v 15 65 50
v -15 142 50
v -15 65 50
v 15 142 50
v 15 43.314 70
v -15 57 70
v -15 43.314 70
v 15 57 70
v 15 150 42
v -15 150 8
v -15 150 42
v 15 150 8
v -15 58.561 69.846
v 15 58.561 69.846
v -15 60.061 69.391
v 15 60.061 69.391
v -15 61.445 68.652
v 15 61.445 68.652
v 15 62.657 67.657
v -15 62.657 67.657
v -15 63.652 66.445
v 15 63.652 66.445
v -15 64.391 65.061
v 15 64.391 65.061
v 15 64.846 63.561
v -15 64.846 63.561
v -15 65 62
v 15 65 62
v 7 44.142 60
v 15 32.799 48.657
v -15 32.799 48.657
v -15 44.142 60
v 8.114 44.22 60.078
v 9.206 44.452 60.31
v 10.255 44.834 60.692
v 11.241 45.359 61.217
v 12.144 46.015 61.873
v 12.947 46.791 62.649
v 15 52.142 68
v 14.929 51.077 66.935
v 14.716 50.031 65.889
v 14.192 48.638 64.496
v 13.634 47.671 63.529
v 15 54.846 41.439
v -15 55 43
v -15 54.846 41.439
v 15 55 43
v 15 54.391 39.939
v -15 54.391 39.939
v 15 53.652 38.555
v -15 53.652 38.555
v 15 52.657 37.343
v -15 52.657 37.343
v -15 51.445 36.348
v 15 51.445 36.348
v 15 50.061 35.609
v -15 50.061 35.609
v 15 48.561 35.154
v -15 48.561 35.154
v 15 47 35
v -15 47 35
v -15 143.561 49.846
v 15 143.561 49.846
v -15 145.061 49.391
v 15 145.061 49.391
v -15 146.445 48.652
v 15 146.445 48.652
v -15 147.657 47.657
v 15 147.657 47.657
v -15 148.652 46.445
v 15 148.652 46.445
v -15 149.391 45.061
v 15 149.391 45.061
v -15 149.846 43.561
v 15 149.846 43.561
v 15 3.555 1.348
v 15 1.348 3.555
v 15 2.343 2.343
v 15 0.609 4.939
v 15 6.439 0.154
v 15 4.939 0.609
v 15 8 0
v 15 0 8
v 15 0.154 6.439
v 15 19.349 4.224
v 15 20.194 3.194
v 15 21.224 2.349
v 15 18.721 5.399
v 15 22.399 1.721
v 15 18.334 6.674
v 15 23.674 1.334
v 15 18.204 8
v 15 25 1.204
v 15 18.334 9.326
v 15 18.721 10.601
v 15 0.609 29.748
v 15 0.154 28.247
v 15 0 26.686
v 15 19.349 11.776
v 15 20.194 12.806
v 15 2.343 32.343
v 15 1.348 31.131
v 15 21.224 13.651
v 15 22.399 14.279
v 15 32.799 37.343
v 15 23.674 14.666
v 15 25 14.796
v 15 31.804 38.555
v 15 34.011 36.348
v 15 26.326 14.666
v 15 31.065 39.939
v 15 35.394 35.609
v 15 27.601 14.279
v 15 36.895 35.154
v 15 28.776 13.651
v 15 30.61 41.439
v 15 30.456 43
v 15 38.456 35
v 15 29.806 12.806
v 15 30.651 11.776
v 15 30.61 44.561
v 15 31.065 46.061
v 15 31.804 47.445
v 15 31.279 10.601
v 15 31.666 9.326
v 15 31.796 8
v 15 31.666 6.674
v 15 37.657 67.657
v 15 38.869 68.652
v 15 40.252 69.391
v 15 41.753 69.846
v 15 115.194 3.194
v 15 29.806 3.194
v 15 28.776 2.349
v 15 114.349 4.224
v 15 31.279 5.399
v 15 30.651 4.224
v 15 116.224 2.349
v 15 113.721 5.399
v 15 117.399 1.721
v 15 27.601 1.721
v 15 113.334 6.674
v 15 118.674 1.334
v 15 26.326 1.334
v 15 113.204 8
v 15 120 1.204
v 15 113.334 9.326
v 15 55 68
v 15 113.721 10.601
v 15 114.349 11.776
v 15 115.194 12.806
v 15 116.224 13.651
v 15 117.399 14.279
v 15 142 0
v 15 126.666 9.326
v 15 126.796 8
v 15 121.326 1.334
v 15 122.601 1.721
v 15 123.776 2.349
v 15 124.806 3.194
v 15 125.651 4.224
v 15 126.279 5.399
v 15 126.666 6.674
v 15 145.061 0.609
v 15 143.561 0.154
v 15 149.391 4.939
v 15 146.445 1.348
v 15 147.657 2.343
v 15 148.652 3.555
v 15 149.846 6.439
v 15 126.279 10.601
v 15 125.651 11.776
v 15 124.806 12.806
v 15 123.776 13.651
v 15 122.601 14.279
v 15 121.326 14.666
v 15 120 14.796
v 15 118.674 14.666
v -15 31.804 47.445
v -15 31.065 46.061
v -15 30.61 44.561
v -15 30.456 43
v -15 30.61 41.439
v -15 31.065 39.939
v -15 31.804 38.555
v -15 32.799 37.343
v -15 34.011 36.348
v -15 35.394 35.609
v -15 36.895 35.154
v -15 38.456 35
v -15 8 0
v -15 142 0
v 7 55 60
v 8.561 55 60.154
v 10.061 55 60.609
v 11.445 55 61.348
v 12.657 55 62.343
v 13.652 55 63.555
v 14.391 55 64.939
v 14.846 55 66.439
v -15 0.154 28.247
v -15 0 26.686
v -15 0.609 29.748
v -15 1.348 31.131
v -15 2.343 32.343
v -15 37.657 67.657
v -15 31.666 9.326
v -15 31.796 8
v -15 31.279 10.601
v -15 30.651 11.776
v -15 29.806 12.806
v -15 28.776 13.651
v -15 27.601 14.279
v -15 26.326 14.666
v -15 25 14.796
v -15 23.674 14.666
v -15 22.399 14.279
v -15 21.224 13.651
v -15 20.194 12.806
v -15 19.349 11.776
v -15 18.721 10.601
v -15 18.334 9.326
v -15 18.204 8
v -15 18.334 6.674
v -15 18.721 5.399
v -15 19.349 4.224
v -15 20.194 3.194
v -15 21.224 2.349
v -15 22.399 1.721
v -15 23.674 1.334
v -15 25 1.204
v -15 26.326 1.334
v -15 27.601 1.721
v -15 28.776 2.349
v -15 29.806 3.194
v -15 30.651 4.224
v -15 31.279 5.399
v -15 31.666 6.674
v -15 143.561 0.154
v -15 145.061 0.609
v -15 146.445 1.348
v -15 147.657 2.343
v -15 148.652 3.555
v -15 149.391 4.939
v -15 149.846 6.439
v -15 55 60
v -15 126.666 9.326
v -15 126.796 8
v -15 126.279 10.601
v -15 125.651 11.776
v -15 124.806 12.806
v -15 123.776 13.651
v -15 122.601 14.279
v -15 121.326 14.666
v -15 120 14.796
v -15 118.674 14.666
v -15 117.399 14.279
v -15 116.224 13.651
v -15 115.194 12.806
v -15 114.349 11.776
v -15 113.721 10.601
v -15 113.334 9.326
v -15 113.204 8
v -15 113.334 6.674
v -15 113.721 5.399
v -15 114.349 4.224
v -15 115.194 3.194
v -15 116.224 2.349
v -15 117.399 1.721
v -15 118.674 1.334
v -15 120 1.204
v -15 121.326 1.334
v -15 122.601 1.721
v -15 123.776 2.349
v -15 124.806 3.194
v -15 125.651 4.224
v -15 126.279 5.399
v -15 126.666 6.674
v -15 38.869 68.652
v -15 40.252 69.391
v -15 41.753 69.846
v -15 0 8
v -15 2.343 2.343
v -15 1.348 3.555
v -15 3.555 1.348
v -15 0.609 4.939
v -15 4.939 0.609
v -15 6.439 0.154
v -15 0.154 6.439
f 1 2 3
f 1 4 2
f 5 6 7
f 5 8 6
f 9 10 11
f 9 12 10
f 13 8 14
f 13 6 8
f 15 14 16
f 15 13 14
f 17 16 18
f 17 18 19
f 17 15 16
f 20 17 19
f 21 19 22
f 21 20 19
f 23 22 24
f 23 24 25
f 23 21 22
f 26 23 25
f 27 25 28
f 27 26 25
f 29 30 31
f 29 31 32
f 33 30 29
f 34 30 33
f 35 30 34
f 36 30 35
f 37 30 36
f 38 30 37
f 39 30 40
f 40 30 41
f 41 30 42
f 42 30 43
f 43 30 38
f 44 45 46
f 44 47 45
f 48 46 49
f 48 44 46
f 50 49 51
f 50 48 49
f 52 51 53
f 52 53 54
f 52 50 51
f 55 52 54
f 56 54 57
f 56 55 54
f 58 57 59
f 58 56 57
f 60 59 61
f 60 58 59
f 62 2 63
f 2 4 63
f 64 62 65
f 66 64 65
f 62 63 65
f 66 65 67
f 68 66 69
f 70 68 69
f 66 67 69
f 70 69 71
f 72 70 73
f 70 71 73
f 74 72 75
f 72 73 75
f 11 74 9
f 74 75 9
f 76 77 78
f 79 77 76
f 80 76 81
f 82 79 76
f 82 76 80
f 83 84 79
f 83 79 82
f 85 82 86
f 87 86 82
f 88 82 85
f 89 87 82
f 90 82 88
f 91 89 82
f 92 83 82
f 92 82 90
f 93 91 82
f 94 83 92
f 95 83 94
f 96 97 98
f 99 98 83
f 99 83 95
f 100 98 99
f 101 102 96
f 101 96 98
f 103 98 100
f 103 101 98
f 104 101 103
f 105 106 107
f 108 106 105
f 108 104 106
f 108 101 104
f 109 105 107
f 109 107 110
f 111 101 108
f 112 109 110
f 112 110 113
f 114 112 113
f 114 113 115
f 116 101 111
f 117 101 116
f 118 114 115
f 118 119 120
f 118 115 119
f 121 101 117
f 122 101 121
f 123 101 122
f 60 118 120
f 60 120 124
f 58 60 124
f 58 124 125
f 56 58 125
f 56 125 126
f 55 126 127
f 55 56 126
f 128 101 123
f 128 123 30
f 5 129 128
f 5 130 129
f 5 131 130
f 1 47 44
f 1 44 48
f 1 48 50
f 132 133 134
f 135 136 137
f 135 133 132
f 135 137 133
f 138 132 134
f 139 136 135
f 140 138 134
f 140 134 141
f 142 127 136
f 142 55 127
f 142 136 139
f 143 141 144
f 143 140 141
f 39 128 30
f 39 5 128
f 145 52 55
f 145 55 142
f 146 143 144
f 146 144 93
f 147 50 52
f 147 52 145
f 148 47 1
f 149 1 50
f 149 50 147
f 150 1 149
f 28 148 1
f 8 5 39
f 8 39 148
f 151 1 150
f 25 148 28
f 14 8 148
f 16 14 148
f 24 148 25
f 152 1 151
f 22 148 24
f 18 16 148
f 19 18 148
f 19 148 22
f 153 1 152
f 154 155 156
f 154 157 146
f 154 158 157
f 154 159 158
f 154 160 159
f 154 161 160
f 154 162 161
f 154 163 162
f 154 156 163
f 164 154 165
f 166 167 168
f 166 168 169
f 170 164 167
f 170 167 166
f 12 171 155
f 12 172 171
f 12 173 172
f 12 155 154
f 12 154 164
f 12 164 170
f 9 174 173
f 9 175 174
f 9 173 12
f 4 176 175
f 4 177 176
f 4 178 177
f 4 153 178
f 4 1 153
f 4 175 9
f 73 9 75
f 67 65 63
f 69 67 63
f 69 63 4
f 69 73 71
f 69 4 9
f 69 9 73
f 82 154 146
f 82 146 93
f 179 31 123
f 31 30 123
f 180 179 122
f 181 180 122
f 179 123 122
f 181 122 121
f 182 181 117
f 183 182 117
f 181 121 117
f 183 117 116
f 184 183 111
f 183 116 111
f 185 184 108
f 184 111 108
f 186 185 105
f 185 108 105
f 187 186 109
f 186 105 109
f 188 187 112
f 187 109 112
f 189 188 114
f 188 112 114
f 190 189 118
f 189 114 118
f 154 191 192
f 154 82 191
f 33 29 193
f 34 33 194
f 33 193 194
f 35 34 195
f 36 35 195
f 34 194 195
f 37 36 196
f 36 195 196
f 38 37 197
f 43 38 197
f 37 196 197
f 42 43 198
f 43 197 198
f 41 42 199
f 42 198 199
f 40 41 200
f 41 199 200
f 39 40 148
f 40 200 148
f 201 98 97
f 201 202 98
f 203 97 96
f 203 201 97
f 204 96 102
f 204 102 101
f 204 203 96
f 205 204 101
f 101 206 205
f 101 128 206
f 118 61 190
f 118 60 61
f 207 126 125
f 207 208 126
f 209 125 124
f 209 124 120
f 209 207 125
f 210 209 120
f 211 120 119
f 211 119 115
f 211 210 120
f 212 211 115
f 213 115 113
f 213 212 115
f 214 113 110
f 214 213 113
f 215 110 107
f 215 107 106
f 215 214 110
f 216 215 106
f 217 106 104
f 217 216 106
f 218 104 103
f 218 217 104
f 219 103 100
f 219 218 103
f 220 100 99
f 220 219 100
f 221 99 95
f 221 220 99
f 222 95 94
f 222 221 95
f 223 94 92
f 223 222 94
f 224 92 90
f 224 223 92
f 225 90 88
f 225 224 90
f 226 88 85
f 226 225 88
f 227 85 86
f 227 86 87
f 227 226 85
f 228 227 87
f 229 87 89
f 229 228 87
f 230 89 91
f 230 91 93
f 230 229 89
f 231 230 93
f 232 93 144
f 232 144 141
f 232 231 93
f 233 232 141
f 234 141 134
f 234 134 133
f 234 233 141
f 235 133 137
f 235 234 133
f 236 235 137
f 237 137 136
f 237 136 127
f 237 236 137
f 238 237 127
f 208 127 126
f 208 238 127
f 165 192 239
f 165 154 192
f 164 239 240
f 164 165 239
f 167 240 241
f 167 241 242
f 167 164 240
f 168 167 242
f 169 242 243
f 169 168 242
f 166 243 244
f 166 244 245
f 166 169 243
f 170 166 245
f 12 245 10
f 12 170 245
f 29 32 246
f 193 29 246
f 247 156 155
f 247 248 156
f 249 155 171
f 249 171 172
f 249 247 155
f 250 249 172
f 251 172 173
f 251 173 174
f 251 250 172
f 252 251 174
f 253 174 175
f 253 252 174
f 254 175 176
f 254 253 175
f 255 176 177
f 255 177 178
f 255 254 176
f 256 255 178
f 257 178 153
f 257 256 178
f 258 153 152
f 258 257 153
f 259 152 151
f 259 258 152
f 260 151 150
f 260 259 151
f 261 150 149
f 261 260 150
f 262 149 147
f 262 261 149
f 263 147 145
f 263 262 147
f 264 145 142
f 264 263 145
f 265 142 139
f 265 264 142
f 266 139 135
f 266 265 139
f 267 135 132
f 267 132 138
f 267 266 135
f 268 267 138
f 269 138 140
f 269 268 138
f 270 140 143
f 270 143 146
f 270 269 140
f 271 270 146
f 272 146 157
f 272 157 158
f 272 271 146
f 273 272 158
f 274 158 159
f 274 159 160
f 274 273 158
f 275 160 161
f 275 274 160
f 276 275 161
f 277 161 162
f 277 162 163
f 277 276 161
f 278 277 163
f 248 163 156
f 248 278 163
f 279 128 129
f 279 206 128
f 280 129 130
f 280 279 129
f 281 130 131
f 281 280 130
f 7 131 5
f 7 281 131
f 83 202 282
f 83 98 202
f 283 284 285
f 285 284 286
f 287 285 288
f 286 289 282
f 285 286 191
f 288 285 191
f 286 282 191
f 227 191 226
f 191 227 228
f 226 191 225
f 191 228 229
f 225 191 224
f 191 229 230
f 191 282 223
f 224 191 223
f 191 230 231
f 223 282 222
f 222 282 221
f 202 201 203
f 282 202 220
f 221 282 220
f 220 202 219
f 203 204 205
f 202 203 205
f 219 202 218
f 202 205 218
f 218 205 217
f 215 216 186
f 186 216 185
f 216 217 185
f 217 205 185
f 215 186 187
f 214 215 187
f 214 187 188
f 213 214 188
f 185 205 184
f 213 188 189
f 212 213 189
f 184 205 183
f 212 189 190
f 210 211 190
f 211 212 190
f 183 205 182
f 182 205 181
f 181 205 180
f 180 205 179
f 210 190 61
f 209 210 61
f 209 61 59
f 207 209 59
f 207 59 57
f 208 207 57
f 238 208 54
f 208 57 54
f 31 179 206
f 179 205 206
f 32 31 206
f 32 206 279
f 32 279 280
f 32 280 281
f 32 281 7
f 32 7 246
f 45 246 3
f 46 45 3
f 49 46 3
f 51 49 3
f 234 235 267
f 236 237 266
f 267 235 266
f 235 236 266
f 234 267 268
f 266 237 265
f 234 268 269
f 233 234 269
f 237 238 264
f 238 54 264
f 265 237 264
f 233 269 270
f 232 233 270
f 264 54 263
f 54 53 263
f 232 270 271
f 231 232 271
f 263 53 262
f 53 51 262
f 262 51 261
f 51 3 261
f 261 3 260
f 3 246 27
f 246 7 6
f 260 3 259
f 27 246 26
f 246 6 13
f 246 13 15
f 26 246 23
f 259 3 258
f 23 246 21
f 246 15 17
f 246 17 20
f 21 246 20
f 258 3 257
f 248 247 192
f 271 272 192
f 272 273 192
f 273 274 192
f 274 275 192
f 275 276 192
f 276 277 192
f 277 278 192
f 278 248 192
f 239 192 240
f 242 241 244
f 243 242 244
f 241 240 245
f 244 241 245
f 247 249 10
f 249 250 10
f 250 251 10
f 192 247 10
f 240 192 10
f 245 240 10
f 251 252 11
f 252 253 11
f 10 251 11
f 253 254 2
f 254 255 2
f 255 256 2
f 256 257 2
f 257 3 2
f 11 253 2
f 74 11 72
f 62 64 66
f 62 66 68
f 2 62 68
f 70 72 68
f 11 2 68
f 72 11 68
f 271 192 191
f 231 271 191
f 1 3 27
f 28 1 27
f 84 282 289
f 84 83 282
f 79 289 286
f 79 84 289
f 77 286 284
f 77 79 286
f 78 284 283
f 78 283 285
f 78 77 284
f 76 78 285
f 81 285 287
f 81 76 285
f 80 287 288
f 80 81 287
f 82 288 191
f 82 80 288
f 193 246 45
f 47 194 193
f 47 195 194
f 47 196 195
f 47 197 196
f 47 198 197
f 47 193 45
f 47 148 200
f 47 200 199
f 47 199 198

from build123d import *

# Parameters (mm, degrees)
F0_R     = 6.7962511827
F1_DEPTH = 15
F2_R     = 8


with BuildPart() as f1:
    # F0 (on Right) → F1 (new body, symmetric)
    with BuildSketch(Plane.YZ):
        Polygon((0, 30), (0, 0), (150, 0), (150, 50), (65, 50), (65, 70), (40, 70), align=None)
        with Locations((25, 8)):
            Circle(F0_R, mode=Mode.SUBTRACT)
        with Locations((120, 8)):
            Circle(F0_R, mode=Mode.SUBTRACT)
        Polygon((44.1421356237, 60), (55, 60), (55, 35), (19.1421356237, 35), align=None, mode=Mode.SUBTRACT)
    extrude(amount=F1_DEPTH, both=True)

    # F2 (call 1 of 9: OpenCascade refuses the feature's edges together)
    f2_edges = [f1.edges().sort_by_distance(p)[0] for p in [
        (0, 40, 70),
    ]]
    fillet(f2_edges, radius=F2_R)

    # F2#2 (call 2 of 9)
    f2_2_edges = [f1.edges().sort_by_distance(p)[0] for p in [
        (0, 65, 70),
    ]]
    fillet(f2_2_edges, radius=F2_R)

    # F2#3 (call 3 of 9)
    f2_3_edges = [f1.edges().sort_by_distance(p)[0] for p in [
        (0, 150, 50),
    ]]
    fillet(f2_3_edges, radius=F2_R)

    # F2#4 (call 4 of 9)
    f2_4_edges = [f1.edges().sort_by_distance(p)[0] for p in [
        (0, 0, 30),
    ]]
    fillet(f2_4_edges, radius=F2_R)

    # F2#5 (call 5 of 9)
    f2_5_edges = [f1.edges().sort_by_distance(p)[0] for p in [
        (0, 0, 0),
    ]]
    fillet(f2_5_edges, radius=F2_R)

    # F2#6 (call 6 of 9)
    f2_6_edges = [f1.edges().sort_by_distance(p)[0] for p in [
        (0, 150, 0),
    ]]
    fillet(f2_6_edges, radius=F2_R)

    # F2#7 (call 7 of 9)
    f2_7_edges = [f1.edges().sort_by_distance(p)[0] for p in [
        (0, 19.142136, 35),
    ]]
    fillet(f2_7_edges, radius=F2_R)

    # F2#8 (call 8 of 9)
    f2_8_edges = [f1.edges().sort_by_distance(p)[0] for p in [
        (15, 49.571068, 60),
    ]]
    fillet(f2_8_edges, radius=F2_R)

    # F2#9 (call 9 of 9)
    f2_9_edges = [f1.edges().sort_by_distance(p)[0] for p in [
        (0, 55, 35),
    ]]
    fillet(f2_9_edges, radius=F2_R)


solid = f1.part
